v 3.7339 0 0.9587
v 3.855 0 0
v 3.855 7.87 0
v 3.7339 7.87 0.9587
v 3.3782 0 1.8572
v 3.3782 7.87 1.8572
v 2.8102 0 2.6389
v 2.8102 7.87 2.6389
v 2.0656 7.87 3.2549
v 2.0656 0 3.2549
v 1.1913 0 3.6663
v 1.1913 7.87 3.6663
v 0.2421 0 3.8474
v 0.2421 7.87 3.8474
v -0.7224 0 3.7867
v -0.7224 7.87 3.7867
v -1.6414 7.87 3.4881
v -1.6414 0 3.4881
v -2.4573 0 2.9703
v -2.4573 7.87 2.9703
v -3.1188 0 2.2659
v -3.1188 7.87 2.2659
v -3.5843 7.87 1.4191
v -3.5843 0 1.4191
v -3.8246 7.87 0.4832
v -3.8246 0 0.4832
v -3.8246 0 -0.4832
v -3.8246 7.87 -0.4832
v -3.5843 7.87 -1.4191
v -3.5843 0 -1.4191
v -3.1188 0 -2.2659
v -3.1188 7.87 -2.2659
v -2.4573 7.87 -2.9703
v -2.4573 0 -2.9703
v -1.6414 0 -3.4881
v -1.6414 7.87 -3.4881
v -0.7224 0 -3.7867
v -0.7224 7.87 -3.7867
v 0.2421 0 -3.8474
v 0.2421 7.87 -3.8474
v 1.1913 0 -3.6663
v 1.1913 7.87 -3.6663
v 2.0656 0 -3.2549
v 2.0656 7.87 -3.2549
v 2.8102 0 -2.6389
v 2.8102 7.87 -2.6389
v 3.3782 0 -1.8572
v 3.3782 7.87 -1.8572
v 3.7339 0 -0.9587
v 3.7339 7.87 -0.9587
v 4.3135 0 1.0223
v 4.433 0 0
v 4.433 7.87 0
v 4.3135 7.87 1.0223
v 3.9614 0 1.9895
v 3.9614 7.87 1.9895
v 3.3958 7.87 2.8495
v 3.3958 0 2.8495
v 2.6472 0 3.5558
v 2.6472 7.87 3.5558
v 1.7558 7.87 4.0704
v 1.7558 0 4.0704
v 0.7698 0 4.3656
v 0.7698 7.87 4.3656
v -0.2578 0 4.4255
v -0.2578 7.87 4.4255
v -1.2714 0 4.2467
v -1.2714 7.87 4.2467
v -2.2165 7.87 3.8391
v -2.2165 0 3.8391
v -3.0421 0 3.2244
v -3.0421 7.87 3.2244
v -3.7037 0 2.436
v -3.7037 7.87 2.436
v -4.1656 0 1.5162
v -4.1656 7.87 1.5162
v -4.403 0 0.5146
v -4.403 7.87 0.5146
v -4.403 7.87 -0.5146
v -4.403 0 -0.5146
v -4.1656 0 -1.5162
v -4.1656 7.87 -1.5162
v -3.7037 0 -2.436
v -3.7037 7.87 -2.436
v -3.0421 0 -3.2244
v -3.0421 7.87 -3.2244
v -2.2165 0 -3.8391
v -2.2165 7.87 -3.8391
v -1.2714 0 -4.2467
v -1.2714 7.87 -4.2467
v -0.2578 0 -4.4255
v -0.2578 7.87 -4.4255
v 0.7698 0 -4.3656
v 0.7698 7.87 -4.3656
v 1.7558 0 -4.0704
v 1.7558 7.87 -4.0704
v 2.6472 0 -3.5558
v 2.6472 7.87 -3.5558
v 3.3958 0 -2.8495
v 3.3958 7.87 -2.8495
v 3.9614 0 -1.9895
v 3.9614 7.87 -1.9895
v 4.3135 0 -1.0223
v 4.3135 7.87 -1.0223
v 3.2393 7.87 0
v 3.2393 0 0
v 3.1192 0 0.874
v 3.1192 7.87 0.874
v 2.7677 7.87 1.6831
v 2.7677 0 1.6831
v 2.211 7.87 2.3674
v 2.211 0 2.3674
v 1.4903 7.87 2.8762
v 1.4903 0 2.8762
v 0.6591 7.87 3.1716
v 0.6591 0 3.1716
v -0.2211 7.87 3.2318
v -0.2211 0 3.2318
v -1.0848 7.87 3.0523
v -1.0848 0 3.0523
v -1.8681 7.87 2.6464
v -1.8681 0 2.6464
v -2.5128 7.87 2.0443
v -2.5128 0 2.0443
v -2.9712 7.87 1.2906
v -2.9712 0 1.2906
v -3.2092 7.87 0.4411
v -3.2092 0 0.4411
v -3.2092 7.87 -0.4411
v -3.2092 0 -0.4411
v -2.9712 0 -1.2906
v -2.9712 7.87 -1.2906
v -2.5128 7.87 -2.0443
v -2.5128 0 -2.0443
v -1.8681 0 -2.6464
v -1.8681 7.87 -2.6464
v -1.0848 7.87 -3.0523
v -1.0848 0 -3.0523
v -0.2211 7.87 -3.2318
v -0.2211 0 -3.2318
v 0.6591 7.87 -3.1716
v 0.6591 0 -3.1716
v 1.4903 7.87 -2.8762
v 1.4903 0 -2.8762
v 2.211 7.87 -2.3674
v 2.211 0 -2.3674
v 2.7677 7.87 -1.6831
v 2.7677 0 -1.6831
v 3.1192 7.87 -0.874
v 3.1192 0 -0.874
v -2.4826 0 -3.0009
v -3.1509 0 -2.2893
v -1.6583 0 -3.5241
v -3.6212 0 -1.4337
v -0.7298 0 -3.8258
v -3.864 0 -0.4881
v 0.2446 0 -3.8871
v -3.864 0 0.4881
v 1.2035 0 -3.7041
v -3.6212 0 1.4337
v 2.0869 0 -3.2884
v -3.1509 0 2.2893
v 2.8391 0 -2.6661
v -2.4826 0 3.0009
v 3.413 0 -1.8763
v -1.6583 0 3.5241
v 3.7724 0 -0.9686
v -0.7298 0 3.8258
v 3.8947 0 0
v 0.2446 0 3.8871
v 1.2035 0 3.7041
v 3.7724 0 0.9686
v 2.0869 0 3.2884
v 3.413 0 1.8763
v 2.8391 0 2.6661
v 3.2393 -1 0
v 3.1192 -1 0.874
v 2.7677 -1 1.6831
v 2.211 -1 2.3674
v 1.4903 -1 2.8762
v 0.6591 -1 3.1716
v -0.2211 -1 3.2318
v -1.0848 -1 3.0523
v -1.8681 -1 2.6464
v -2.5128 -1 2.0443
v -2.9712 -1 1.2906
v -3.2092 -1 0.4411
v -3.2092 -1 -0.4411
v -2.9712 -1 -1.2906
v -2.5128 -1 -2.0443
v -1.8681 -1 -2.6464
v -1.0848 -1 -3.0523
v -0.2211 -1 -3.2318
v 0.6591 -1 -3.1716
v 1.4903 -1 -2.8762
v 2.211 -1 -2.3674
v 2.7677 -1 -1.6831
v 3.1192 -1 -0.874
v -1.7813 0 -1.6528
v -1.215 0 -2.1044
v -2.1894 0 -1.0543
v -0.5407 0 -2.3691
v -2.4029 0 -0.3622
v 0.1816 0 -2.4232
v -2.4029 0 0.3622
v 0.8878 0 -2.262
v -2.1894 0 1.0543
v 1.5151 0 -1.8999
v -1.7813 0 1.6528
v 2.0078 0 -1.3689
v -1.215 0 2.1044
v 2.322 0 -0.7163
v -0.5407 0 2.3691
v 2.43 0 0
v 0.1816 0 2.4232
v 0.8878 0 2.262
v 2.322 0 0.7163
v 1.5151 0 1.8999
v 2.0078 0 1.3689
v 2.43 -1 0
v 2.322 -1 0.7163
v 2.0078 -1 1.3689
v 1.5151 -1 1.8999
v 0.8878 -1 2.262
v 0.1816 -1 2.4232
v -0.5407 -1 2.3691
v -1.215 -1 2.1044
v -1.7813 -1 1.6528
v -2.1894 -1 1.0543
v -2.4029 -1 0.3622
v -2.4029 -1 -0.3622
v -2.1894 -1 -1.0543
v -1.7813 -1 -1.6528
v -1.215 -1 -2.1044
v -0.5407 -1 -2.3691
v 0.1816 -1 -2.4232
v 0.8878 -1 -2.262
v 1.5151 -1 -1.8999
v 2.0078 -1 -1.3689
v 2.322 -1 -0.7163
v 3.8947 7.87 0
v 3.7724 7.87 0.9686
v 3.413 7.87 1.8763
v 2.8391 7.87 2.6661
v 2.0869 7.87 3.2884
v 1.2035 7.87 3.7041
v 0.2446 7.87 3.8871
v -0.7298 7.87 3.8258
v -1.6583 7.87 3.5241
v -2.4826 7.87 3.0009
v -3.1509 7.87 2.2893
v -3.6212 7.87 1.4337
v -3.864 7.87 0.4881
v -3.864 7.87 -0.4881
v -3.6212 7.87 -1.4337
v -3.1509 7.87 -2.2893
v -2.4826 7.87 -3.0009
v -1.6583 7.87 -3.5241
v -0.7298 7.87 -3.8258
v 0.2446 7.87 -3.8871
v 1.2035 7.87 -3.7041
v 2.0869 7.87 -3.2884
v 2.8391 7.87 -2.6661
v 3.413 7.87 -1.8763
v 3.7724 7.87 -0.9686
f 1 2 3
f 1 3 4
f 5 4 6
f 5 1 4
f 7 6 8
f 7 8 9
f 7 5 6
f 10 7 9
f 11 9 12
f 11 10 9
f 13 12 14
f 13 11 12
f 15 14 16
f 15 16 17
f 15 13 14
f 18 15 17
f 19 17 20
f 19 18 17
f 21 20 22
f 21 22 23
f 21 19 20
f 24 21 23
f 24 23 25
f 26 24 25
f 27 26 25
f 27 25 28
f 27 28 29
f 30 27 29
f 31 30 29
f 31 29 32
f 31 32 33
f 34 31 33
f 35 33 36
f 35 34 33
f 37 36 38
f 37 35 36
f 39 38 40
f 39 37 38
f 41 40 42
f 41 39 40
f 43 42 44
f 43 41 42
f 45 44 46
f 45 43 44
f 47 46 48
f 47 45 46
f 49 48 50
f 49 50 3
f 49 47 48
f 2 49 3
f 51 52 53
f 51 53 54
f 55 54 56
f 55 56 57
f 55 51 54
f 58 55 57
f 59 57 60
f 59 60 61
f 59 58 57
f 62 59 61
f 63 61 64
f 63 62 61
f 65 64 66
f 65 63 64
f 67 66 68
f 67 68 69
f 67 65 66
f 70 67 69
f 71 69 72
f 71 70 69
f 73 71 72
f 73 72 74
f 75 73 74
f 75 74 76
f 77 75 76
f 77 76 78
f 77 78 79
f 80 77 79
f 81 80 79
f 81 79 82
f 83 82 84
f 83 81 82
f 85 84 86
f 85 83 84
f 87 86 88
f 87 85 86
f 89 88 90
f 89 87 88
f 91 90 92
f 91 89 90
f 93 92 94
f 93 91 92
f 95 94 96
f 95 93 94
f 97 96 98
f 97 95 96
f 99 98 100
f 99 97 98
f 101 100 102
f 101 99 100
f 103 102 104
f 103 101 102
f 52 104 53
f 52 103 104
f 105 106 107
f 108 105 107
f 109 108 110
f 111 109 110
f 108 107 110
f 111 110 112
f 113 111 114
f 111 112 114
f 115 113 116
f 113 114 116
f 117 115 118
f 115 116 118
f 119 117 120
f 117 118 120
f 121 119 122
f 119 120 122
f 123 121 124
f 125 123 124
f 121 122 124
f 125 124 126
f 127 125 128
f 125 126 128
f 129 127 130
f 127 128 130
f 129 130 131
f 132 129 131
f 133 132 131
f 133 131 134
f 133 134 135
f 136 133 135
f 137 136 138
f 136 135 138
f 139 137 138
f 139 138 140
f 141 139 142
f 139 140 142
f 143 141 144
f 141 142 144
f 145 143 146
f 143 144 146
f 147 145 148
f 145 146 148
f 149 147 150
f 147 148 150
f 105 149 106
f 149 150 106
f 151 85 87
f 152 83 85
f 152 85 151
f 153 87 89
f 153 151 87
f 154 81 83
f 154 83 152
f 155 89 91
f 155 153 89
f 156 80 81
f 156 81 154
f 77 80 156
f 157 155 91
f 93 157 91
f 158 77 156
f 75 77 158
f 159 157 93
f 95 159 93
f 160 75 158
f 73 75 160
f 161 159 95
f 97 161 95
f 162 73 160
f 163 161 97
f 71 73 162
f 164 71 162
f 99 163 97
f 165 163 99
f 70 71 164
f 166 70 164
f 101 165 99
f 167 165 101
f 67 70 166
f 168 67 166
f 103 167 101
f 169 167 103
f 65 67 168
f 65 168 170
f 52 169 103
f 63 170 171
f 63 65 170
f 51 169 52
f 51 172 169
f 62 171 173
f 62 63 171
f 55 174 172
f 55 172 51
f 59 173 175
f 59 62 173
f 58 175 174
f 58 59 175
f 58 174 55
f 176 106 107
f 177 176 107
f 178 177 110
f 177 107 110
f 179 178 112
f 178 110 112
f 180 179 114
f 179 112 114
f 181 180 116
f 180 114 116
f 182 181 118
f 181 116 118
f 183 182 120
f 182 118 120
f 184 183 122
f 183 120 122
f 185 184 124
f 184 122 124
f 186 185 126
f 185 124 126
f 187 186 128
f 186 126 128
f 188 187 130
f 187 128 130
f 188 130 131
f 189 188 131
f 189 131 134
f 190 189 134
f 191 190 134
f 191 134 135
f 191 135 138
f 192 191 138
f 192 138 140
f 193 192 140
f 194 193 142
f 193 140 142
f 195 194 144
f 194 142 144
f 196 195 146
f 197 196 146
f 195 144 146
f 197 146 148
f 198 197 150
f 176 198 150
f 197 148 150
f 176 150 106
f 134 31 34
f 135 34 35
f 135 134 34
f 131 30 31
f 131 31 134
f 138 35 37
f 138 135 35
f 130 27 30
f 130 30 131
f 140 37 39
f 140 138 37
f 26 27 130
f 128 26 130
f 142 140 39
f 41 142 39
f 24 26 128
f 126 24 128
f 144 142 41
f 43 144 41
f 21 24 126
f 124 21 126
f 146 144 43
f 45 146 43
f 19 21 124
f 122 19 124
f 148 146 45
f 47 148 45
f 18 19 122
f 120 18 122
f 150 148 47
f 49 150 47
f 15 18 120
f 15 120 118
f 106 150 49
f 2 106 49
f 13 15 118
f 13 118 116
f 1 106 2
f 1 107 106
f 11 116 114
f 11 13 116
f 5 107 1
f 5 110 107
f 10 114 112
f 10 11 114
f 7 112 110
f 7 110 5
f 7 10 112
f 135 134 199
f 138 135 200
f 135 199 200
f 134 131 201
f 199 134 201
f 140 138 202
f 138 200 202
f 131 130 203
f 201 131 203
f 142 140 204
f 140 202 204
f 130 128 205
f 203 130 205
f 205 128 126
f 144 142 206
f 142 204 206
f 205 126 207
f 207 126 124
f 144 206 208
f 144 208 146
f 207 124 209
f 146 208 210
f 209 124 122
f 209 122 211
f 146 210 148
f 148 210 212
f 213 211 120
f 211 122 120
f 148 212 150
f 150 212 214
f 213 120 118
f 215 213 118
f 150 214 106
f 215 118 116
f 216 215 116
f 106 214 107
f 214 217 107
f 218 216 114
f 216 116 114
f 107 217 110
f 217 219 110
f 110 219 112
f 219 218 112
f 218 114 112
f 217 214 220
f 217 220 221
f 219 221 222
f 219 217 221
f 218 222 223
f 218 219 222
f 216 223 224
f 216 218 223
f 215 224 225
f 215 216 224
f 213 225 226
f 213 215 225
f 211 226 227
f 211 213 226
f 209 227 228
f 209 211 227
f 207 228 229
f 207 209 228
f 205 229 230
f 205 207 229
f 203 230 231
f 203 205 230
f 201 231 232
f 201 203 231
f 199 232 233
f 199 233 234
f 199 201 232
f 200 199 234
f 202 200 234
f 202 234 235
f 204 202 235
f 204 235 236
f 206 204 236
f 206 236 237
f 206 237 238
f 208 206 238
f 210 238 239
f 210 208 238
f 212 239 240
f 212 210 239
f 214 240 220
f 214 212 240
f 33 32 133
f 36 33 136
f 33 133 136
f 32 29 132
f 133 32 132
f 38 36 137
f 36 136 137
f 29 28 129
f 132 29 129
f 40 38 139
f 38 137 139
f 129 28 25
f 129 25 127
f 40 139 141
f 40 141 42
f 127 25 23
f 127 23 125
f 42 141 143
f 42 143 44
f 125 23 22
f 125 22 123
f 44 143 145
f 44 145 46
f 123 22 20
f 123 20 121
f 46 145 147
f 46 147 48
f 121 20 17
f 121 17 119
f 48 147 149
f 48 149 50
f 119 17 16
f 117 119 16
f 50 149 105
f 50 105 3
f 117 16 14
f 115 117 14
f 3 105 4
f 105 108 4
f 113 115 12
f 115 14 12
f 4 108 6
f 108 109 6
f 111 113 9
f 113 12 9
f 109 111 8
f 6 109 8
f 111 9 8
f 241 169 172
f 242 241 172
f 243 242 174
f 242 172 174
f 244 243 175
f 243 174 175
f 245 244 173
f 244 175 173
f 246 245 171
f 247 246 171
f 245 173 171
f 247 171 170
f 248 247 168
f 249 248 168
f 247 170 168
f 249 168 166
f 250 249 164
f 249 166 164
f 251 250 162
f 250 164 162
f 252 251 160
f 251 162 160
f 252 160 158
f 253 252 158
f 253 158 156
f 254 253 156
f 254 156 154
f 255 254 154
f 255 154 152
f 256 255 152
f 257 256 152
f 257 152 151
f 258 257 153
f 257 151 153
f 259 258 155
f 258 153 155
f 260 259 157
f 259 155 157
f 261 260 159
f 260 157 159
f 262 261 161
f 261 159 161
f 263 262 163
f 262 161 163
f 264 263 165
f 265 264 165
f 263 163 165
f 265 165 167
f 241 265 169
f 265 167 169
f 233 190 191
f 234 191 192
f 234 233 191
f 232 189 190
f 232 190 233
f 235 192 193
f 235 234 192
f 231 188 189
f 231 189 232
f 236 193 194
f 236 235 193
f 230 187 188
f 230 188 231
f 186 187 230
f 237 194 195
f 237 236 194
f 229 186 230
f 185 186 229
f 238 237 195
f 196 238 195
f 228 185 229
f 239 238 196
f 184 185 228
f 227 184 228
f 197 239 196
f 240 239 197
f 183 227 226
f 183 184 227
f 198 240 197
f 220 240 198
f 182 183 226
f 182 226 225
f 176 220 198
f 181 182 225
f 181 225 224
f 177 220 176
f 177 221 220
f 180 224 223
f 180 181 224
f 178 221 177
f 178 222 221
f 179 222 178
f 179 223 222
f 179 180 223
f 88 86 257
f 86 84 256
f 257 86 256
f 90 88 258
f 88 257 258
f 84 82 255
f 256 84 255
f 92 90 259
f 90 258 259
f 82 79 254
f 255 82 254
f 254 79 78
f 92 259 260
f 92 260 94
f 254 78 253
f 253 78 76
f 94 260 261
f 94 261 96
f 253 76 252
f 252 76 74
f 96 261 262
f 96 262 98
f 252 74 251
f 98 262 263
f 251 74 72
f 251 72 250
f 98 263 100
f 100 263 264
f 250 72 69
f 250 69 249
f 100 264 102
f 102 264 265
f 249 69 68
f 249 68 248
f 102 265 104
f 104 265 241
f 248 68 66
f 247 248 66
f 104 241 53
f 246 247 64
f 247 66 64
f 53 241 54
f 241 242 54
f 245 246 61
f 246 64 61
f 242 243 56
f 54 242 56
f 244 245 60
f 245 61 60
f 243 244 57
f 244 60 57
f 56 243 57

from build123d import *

# Parameters (mm, degrees)
F0_R     = 4.4329603323
F0_R_2   = 3.894738079
F1_DEPTH = 7.87
F0_R_3   = 3.855
F0_R_4   = 3.239330786
F0_R_5   = 2.43
F2_DEPTH = 1


# Not quite as in the source:
# - the program builds the solid bodies; features that only make, move or delete a surface that nothing else refers to are left out


with BuildPart() as f1:
    # F0 (on Front) → F1 (new body)
    with BuildSketch(Plane.XZ):
        Circle(F0_R)
        Circle(F0_R_2, mode=Mode.SUBTRACT)
    extrude(amount=-F1_DEPTH)


with BuildPart() as f1b:
    # F0 (on Front) → F1, piece 2 (new body)
    with BuildSketch(Plane.XZ):
        Circle(F0_R_3)
        Circle(F0_R_4, mode=Mode.SUBTRACT)
    extrude(amount=-F1_DEPTH)


with BuildPart() as f2:
    # F0 (on Front) → F2 (new body)
    with BuildSketch(Plane.XZ):
        Circle(F0_R_4)
        Circle(F0_R_5, mode=Mode.SUBTRACT)
    extrude(amount=F2_DEPTH)


solid = Compound([f1.part, f1b.part, f2.part])
